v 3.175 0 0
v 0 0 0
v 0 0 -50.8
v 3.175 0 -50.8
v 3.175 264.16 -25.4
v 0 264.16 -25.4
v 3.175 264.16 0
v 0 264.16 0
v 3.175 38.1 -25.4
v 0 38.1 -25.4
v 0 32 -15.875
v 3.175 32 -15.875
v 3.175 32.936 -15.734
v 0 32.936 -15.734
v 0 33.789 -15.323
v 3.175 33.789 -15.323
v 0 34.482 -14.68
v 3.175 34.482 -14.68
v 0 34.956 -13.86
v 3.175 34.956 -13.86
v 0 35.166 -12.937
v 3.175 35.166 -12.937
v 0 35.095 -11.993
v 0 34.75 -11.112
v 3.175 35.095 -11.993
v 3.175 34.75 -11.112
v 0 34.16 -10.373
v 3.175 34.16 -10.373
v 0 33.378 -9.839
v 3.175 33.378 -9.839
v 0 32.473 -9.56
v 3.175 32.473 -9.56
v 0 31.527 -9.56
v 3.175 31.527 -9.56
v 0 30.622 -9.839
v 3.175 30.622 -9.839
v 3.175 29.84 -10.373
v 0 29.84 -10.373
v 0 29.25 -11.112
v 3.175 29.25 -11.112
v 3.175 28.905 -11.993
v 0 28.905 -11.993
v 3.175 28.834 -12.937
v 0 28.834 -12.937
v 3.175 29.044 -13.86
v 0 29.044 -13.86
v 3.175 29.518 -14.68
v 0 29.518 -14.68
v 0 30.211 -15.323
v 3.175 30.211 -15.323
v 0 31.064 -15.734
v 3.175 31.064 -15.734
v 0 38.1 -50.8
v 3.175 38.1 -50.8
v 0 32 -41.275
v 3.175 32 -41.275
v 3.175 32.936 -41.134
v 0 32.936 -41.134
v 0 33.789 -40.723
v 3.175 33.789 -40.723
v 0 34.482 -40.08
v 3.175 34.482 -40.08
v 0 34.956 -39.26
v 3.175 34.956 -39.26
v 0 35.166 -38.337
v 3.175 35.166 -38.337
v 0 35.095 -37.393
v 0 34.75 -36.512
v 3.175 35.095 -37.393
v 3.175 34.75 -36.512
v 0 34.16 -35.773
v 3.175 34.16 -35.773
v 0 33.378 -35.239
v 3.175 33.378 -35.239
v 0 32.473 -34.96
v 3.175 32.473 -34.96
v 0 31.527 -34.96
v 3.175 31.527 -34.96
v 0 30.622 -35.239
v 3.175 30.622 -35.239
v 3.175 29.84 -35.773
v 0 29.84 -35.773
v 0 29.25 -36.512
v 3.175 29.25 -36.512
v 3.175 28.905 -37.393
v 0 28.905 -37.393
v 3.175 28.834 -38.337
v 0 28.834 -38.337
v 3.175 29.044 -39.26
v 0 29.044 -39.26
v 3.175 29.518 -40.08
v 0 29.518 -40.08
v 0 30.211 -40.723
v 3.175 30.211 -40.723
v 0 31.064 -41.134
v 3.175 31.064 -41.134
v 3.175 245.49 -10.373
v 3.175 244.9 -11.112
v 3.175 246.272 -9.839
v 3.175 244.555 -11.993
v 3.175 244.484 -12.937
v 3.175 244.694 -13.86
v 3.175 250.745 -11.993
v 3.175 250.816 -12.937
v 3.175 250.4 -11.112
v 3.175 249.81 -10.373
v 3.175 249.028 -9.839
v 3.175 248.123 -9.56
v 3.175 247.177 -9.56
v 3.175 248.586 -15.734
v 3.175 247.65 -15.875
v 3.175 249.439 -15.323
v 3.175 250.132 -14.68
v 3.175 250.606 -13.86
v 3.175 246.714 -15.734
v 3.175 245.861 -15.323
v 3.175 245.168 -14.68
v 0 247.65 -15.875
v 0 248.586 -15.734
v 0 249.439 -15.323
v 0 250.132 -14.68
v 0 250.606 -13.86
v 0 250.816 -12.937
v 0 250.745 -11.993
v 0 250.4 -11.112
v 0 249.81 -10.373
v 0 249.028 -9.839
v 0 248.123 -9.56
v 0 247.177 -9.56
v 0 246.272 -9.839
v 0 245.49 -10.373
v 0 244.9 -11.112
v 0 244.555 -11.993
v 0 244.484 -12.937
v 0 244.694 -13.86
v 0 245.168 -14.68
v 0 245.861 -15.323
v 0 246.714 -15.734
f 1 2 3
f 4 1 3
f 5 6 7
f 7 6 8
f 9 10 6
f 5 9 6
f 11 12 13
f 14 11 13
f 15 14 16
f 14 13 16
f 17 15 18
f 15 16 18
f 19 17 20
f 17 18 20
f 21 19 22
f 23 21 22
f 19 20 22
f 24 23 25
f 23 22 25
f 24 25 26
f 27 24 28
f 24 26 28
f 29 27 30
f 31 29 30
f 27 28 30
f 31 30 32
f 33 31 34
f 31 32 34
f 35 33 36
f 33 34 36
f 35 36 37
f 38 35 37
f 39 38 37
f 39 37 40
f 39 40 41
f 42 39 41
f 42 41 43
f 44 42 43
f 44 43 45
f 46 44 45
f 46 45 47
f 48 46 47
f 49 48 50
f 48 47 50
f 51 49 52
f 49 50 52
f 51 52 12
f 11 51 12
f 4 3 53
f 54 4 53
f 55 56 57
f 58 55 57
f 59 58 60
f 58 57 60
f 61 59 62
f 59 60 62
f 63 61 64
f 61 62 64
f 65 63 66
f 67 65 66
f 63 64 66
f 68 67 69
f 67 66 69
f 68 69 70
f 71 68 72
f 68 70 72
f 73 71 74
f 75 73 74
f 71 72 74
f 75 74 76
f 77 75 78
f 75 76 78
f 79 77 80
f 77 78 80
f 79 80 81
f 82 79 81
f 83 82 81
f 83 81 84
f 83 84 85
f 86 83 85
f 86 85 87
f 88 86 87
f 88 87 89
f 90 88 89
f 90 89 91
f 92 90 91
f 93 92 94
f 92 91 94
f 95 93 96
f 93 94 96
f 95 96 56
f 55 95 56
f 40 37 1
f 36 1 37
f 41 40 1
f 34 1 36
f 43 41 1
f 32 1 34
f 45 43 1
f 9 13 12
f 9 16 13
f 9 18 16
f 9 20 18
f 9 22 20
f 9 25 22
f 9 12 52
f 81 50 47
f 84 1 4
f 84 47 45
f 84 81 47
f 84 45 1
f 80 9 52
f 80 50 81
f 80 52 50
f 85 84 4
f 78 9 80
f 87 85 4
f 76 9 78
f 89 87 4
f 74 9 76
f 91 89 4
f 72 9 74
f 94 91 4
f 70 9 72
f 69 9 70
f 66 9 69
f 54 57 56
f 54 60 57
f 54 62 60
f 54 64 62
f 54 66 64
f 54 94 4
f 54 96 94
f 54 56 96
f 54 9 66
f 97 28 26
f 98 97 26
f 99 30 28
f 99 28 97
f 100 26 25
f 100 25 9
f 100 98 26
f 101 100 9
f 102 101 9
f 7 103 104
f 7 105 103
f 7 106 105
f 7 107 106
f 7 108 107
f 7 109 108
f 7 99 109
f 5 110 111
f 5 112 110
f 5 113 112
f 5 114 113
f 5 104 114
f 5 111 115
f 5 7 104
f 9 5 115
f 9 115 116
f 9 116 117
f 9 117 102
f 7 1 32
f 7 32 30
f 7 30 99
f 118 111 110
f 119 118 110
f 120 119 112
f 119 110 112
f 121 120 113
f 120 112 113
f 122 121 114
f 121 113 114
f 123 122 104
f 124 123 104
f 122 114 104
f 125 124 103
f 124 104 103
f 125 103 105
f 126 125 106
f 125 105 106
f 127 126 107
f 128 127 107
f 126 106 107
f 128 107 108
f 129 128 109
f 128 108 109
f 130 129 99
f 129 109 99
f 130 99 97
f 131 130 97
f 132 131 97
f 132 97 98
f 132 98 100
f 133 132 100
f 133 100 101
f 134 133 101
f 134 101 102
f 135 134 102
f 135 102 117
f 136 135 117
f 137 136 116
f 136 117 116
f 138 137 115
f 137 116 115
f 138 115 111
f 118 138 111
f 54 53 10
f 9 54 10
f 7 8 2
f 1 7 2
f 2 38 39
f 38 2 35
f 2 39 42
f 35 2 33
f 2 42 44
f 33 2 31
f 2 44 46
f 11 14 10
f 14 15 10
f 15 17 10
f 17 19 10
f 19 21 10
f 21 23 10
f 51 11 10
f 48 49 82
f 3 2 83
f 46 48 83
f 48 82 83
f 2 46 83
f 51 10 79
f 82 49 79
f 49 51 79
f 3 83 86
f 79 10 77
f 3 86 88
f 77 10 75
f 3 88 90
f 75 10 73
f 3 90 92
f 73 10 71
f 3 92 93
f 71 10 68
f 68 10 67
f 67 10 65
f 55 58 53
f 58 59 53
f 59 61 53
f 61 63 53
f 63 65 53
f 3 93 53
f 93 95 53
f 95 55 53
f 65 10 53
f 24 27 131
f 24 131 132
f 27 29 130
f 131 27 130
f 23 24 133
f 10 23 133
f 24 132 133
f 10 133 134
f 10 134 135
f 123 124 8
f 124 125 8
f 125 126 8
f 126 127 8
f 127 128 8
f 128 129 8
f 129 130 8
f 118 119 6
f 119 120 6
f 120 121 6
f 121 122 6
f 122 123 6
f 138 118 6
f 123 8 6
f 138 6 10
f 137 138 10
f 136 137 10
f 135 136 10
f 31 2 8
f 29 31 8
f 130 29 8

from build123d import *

# Parameters (mm, degrees)
BOSS_EXTRUDE1_DEPTH = 3.175
SKETCH2_R           = 3.175
CUT_EXTRUDE1_DEPTH  = 3.175


with BuildPart() as part:
    # Sketch1 → Boss-Extrude1 (new body)
    with BuildSketch(Plane(origin=(0, 0, 0), x_dir=(0, 0, -1), z_dir=(1, 0, 0))):
        Polygon((0, 0), (25.4, 0), (50.8, 0), (50.8, 38.1), (25.4, 38.1), (25.4, 264.16), (0, 264.16), align=None)
    extrude(amount=BOSS_EXTRUDE1_DEPTH)

    # Sketch2 → Cut-Extrude1 (cut)
    with BuildSketch(Plane(origin=(3.175, 0, 0), x_dir=(0, 0, -1), z_dir=(1, 0, 0))):
        with Locations((12.7, 247.65)):
            Circle(SKETCH2_R)
        with Locations((38.1, 32)):
            Circle(SKETCH2_R)
        with Locations((12.7, 32)):
            Circle(SKETCH2_R)
    extrude(amount=-CUT_EXTRUDE1_DEPTH, mode=Mode.SUBTRACT)


solid = part.part
